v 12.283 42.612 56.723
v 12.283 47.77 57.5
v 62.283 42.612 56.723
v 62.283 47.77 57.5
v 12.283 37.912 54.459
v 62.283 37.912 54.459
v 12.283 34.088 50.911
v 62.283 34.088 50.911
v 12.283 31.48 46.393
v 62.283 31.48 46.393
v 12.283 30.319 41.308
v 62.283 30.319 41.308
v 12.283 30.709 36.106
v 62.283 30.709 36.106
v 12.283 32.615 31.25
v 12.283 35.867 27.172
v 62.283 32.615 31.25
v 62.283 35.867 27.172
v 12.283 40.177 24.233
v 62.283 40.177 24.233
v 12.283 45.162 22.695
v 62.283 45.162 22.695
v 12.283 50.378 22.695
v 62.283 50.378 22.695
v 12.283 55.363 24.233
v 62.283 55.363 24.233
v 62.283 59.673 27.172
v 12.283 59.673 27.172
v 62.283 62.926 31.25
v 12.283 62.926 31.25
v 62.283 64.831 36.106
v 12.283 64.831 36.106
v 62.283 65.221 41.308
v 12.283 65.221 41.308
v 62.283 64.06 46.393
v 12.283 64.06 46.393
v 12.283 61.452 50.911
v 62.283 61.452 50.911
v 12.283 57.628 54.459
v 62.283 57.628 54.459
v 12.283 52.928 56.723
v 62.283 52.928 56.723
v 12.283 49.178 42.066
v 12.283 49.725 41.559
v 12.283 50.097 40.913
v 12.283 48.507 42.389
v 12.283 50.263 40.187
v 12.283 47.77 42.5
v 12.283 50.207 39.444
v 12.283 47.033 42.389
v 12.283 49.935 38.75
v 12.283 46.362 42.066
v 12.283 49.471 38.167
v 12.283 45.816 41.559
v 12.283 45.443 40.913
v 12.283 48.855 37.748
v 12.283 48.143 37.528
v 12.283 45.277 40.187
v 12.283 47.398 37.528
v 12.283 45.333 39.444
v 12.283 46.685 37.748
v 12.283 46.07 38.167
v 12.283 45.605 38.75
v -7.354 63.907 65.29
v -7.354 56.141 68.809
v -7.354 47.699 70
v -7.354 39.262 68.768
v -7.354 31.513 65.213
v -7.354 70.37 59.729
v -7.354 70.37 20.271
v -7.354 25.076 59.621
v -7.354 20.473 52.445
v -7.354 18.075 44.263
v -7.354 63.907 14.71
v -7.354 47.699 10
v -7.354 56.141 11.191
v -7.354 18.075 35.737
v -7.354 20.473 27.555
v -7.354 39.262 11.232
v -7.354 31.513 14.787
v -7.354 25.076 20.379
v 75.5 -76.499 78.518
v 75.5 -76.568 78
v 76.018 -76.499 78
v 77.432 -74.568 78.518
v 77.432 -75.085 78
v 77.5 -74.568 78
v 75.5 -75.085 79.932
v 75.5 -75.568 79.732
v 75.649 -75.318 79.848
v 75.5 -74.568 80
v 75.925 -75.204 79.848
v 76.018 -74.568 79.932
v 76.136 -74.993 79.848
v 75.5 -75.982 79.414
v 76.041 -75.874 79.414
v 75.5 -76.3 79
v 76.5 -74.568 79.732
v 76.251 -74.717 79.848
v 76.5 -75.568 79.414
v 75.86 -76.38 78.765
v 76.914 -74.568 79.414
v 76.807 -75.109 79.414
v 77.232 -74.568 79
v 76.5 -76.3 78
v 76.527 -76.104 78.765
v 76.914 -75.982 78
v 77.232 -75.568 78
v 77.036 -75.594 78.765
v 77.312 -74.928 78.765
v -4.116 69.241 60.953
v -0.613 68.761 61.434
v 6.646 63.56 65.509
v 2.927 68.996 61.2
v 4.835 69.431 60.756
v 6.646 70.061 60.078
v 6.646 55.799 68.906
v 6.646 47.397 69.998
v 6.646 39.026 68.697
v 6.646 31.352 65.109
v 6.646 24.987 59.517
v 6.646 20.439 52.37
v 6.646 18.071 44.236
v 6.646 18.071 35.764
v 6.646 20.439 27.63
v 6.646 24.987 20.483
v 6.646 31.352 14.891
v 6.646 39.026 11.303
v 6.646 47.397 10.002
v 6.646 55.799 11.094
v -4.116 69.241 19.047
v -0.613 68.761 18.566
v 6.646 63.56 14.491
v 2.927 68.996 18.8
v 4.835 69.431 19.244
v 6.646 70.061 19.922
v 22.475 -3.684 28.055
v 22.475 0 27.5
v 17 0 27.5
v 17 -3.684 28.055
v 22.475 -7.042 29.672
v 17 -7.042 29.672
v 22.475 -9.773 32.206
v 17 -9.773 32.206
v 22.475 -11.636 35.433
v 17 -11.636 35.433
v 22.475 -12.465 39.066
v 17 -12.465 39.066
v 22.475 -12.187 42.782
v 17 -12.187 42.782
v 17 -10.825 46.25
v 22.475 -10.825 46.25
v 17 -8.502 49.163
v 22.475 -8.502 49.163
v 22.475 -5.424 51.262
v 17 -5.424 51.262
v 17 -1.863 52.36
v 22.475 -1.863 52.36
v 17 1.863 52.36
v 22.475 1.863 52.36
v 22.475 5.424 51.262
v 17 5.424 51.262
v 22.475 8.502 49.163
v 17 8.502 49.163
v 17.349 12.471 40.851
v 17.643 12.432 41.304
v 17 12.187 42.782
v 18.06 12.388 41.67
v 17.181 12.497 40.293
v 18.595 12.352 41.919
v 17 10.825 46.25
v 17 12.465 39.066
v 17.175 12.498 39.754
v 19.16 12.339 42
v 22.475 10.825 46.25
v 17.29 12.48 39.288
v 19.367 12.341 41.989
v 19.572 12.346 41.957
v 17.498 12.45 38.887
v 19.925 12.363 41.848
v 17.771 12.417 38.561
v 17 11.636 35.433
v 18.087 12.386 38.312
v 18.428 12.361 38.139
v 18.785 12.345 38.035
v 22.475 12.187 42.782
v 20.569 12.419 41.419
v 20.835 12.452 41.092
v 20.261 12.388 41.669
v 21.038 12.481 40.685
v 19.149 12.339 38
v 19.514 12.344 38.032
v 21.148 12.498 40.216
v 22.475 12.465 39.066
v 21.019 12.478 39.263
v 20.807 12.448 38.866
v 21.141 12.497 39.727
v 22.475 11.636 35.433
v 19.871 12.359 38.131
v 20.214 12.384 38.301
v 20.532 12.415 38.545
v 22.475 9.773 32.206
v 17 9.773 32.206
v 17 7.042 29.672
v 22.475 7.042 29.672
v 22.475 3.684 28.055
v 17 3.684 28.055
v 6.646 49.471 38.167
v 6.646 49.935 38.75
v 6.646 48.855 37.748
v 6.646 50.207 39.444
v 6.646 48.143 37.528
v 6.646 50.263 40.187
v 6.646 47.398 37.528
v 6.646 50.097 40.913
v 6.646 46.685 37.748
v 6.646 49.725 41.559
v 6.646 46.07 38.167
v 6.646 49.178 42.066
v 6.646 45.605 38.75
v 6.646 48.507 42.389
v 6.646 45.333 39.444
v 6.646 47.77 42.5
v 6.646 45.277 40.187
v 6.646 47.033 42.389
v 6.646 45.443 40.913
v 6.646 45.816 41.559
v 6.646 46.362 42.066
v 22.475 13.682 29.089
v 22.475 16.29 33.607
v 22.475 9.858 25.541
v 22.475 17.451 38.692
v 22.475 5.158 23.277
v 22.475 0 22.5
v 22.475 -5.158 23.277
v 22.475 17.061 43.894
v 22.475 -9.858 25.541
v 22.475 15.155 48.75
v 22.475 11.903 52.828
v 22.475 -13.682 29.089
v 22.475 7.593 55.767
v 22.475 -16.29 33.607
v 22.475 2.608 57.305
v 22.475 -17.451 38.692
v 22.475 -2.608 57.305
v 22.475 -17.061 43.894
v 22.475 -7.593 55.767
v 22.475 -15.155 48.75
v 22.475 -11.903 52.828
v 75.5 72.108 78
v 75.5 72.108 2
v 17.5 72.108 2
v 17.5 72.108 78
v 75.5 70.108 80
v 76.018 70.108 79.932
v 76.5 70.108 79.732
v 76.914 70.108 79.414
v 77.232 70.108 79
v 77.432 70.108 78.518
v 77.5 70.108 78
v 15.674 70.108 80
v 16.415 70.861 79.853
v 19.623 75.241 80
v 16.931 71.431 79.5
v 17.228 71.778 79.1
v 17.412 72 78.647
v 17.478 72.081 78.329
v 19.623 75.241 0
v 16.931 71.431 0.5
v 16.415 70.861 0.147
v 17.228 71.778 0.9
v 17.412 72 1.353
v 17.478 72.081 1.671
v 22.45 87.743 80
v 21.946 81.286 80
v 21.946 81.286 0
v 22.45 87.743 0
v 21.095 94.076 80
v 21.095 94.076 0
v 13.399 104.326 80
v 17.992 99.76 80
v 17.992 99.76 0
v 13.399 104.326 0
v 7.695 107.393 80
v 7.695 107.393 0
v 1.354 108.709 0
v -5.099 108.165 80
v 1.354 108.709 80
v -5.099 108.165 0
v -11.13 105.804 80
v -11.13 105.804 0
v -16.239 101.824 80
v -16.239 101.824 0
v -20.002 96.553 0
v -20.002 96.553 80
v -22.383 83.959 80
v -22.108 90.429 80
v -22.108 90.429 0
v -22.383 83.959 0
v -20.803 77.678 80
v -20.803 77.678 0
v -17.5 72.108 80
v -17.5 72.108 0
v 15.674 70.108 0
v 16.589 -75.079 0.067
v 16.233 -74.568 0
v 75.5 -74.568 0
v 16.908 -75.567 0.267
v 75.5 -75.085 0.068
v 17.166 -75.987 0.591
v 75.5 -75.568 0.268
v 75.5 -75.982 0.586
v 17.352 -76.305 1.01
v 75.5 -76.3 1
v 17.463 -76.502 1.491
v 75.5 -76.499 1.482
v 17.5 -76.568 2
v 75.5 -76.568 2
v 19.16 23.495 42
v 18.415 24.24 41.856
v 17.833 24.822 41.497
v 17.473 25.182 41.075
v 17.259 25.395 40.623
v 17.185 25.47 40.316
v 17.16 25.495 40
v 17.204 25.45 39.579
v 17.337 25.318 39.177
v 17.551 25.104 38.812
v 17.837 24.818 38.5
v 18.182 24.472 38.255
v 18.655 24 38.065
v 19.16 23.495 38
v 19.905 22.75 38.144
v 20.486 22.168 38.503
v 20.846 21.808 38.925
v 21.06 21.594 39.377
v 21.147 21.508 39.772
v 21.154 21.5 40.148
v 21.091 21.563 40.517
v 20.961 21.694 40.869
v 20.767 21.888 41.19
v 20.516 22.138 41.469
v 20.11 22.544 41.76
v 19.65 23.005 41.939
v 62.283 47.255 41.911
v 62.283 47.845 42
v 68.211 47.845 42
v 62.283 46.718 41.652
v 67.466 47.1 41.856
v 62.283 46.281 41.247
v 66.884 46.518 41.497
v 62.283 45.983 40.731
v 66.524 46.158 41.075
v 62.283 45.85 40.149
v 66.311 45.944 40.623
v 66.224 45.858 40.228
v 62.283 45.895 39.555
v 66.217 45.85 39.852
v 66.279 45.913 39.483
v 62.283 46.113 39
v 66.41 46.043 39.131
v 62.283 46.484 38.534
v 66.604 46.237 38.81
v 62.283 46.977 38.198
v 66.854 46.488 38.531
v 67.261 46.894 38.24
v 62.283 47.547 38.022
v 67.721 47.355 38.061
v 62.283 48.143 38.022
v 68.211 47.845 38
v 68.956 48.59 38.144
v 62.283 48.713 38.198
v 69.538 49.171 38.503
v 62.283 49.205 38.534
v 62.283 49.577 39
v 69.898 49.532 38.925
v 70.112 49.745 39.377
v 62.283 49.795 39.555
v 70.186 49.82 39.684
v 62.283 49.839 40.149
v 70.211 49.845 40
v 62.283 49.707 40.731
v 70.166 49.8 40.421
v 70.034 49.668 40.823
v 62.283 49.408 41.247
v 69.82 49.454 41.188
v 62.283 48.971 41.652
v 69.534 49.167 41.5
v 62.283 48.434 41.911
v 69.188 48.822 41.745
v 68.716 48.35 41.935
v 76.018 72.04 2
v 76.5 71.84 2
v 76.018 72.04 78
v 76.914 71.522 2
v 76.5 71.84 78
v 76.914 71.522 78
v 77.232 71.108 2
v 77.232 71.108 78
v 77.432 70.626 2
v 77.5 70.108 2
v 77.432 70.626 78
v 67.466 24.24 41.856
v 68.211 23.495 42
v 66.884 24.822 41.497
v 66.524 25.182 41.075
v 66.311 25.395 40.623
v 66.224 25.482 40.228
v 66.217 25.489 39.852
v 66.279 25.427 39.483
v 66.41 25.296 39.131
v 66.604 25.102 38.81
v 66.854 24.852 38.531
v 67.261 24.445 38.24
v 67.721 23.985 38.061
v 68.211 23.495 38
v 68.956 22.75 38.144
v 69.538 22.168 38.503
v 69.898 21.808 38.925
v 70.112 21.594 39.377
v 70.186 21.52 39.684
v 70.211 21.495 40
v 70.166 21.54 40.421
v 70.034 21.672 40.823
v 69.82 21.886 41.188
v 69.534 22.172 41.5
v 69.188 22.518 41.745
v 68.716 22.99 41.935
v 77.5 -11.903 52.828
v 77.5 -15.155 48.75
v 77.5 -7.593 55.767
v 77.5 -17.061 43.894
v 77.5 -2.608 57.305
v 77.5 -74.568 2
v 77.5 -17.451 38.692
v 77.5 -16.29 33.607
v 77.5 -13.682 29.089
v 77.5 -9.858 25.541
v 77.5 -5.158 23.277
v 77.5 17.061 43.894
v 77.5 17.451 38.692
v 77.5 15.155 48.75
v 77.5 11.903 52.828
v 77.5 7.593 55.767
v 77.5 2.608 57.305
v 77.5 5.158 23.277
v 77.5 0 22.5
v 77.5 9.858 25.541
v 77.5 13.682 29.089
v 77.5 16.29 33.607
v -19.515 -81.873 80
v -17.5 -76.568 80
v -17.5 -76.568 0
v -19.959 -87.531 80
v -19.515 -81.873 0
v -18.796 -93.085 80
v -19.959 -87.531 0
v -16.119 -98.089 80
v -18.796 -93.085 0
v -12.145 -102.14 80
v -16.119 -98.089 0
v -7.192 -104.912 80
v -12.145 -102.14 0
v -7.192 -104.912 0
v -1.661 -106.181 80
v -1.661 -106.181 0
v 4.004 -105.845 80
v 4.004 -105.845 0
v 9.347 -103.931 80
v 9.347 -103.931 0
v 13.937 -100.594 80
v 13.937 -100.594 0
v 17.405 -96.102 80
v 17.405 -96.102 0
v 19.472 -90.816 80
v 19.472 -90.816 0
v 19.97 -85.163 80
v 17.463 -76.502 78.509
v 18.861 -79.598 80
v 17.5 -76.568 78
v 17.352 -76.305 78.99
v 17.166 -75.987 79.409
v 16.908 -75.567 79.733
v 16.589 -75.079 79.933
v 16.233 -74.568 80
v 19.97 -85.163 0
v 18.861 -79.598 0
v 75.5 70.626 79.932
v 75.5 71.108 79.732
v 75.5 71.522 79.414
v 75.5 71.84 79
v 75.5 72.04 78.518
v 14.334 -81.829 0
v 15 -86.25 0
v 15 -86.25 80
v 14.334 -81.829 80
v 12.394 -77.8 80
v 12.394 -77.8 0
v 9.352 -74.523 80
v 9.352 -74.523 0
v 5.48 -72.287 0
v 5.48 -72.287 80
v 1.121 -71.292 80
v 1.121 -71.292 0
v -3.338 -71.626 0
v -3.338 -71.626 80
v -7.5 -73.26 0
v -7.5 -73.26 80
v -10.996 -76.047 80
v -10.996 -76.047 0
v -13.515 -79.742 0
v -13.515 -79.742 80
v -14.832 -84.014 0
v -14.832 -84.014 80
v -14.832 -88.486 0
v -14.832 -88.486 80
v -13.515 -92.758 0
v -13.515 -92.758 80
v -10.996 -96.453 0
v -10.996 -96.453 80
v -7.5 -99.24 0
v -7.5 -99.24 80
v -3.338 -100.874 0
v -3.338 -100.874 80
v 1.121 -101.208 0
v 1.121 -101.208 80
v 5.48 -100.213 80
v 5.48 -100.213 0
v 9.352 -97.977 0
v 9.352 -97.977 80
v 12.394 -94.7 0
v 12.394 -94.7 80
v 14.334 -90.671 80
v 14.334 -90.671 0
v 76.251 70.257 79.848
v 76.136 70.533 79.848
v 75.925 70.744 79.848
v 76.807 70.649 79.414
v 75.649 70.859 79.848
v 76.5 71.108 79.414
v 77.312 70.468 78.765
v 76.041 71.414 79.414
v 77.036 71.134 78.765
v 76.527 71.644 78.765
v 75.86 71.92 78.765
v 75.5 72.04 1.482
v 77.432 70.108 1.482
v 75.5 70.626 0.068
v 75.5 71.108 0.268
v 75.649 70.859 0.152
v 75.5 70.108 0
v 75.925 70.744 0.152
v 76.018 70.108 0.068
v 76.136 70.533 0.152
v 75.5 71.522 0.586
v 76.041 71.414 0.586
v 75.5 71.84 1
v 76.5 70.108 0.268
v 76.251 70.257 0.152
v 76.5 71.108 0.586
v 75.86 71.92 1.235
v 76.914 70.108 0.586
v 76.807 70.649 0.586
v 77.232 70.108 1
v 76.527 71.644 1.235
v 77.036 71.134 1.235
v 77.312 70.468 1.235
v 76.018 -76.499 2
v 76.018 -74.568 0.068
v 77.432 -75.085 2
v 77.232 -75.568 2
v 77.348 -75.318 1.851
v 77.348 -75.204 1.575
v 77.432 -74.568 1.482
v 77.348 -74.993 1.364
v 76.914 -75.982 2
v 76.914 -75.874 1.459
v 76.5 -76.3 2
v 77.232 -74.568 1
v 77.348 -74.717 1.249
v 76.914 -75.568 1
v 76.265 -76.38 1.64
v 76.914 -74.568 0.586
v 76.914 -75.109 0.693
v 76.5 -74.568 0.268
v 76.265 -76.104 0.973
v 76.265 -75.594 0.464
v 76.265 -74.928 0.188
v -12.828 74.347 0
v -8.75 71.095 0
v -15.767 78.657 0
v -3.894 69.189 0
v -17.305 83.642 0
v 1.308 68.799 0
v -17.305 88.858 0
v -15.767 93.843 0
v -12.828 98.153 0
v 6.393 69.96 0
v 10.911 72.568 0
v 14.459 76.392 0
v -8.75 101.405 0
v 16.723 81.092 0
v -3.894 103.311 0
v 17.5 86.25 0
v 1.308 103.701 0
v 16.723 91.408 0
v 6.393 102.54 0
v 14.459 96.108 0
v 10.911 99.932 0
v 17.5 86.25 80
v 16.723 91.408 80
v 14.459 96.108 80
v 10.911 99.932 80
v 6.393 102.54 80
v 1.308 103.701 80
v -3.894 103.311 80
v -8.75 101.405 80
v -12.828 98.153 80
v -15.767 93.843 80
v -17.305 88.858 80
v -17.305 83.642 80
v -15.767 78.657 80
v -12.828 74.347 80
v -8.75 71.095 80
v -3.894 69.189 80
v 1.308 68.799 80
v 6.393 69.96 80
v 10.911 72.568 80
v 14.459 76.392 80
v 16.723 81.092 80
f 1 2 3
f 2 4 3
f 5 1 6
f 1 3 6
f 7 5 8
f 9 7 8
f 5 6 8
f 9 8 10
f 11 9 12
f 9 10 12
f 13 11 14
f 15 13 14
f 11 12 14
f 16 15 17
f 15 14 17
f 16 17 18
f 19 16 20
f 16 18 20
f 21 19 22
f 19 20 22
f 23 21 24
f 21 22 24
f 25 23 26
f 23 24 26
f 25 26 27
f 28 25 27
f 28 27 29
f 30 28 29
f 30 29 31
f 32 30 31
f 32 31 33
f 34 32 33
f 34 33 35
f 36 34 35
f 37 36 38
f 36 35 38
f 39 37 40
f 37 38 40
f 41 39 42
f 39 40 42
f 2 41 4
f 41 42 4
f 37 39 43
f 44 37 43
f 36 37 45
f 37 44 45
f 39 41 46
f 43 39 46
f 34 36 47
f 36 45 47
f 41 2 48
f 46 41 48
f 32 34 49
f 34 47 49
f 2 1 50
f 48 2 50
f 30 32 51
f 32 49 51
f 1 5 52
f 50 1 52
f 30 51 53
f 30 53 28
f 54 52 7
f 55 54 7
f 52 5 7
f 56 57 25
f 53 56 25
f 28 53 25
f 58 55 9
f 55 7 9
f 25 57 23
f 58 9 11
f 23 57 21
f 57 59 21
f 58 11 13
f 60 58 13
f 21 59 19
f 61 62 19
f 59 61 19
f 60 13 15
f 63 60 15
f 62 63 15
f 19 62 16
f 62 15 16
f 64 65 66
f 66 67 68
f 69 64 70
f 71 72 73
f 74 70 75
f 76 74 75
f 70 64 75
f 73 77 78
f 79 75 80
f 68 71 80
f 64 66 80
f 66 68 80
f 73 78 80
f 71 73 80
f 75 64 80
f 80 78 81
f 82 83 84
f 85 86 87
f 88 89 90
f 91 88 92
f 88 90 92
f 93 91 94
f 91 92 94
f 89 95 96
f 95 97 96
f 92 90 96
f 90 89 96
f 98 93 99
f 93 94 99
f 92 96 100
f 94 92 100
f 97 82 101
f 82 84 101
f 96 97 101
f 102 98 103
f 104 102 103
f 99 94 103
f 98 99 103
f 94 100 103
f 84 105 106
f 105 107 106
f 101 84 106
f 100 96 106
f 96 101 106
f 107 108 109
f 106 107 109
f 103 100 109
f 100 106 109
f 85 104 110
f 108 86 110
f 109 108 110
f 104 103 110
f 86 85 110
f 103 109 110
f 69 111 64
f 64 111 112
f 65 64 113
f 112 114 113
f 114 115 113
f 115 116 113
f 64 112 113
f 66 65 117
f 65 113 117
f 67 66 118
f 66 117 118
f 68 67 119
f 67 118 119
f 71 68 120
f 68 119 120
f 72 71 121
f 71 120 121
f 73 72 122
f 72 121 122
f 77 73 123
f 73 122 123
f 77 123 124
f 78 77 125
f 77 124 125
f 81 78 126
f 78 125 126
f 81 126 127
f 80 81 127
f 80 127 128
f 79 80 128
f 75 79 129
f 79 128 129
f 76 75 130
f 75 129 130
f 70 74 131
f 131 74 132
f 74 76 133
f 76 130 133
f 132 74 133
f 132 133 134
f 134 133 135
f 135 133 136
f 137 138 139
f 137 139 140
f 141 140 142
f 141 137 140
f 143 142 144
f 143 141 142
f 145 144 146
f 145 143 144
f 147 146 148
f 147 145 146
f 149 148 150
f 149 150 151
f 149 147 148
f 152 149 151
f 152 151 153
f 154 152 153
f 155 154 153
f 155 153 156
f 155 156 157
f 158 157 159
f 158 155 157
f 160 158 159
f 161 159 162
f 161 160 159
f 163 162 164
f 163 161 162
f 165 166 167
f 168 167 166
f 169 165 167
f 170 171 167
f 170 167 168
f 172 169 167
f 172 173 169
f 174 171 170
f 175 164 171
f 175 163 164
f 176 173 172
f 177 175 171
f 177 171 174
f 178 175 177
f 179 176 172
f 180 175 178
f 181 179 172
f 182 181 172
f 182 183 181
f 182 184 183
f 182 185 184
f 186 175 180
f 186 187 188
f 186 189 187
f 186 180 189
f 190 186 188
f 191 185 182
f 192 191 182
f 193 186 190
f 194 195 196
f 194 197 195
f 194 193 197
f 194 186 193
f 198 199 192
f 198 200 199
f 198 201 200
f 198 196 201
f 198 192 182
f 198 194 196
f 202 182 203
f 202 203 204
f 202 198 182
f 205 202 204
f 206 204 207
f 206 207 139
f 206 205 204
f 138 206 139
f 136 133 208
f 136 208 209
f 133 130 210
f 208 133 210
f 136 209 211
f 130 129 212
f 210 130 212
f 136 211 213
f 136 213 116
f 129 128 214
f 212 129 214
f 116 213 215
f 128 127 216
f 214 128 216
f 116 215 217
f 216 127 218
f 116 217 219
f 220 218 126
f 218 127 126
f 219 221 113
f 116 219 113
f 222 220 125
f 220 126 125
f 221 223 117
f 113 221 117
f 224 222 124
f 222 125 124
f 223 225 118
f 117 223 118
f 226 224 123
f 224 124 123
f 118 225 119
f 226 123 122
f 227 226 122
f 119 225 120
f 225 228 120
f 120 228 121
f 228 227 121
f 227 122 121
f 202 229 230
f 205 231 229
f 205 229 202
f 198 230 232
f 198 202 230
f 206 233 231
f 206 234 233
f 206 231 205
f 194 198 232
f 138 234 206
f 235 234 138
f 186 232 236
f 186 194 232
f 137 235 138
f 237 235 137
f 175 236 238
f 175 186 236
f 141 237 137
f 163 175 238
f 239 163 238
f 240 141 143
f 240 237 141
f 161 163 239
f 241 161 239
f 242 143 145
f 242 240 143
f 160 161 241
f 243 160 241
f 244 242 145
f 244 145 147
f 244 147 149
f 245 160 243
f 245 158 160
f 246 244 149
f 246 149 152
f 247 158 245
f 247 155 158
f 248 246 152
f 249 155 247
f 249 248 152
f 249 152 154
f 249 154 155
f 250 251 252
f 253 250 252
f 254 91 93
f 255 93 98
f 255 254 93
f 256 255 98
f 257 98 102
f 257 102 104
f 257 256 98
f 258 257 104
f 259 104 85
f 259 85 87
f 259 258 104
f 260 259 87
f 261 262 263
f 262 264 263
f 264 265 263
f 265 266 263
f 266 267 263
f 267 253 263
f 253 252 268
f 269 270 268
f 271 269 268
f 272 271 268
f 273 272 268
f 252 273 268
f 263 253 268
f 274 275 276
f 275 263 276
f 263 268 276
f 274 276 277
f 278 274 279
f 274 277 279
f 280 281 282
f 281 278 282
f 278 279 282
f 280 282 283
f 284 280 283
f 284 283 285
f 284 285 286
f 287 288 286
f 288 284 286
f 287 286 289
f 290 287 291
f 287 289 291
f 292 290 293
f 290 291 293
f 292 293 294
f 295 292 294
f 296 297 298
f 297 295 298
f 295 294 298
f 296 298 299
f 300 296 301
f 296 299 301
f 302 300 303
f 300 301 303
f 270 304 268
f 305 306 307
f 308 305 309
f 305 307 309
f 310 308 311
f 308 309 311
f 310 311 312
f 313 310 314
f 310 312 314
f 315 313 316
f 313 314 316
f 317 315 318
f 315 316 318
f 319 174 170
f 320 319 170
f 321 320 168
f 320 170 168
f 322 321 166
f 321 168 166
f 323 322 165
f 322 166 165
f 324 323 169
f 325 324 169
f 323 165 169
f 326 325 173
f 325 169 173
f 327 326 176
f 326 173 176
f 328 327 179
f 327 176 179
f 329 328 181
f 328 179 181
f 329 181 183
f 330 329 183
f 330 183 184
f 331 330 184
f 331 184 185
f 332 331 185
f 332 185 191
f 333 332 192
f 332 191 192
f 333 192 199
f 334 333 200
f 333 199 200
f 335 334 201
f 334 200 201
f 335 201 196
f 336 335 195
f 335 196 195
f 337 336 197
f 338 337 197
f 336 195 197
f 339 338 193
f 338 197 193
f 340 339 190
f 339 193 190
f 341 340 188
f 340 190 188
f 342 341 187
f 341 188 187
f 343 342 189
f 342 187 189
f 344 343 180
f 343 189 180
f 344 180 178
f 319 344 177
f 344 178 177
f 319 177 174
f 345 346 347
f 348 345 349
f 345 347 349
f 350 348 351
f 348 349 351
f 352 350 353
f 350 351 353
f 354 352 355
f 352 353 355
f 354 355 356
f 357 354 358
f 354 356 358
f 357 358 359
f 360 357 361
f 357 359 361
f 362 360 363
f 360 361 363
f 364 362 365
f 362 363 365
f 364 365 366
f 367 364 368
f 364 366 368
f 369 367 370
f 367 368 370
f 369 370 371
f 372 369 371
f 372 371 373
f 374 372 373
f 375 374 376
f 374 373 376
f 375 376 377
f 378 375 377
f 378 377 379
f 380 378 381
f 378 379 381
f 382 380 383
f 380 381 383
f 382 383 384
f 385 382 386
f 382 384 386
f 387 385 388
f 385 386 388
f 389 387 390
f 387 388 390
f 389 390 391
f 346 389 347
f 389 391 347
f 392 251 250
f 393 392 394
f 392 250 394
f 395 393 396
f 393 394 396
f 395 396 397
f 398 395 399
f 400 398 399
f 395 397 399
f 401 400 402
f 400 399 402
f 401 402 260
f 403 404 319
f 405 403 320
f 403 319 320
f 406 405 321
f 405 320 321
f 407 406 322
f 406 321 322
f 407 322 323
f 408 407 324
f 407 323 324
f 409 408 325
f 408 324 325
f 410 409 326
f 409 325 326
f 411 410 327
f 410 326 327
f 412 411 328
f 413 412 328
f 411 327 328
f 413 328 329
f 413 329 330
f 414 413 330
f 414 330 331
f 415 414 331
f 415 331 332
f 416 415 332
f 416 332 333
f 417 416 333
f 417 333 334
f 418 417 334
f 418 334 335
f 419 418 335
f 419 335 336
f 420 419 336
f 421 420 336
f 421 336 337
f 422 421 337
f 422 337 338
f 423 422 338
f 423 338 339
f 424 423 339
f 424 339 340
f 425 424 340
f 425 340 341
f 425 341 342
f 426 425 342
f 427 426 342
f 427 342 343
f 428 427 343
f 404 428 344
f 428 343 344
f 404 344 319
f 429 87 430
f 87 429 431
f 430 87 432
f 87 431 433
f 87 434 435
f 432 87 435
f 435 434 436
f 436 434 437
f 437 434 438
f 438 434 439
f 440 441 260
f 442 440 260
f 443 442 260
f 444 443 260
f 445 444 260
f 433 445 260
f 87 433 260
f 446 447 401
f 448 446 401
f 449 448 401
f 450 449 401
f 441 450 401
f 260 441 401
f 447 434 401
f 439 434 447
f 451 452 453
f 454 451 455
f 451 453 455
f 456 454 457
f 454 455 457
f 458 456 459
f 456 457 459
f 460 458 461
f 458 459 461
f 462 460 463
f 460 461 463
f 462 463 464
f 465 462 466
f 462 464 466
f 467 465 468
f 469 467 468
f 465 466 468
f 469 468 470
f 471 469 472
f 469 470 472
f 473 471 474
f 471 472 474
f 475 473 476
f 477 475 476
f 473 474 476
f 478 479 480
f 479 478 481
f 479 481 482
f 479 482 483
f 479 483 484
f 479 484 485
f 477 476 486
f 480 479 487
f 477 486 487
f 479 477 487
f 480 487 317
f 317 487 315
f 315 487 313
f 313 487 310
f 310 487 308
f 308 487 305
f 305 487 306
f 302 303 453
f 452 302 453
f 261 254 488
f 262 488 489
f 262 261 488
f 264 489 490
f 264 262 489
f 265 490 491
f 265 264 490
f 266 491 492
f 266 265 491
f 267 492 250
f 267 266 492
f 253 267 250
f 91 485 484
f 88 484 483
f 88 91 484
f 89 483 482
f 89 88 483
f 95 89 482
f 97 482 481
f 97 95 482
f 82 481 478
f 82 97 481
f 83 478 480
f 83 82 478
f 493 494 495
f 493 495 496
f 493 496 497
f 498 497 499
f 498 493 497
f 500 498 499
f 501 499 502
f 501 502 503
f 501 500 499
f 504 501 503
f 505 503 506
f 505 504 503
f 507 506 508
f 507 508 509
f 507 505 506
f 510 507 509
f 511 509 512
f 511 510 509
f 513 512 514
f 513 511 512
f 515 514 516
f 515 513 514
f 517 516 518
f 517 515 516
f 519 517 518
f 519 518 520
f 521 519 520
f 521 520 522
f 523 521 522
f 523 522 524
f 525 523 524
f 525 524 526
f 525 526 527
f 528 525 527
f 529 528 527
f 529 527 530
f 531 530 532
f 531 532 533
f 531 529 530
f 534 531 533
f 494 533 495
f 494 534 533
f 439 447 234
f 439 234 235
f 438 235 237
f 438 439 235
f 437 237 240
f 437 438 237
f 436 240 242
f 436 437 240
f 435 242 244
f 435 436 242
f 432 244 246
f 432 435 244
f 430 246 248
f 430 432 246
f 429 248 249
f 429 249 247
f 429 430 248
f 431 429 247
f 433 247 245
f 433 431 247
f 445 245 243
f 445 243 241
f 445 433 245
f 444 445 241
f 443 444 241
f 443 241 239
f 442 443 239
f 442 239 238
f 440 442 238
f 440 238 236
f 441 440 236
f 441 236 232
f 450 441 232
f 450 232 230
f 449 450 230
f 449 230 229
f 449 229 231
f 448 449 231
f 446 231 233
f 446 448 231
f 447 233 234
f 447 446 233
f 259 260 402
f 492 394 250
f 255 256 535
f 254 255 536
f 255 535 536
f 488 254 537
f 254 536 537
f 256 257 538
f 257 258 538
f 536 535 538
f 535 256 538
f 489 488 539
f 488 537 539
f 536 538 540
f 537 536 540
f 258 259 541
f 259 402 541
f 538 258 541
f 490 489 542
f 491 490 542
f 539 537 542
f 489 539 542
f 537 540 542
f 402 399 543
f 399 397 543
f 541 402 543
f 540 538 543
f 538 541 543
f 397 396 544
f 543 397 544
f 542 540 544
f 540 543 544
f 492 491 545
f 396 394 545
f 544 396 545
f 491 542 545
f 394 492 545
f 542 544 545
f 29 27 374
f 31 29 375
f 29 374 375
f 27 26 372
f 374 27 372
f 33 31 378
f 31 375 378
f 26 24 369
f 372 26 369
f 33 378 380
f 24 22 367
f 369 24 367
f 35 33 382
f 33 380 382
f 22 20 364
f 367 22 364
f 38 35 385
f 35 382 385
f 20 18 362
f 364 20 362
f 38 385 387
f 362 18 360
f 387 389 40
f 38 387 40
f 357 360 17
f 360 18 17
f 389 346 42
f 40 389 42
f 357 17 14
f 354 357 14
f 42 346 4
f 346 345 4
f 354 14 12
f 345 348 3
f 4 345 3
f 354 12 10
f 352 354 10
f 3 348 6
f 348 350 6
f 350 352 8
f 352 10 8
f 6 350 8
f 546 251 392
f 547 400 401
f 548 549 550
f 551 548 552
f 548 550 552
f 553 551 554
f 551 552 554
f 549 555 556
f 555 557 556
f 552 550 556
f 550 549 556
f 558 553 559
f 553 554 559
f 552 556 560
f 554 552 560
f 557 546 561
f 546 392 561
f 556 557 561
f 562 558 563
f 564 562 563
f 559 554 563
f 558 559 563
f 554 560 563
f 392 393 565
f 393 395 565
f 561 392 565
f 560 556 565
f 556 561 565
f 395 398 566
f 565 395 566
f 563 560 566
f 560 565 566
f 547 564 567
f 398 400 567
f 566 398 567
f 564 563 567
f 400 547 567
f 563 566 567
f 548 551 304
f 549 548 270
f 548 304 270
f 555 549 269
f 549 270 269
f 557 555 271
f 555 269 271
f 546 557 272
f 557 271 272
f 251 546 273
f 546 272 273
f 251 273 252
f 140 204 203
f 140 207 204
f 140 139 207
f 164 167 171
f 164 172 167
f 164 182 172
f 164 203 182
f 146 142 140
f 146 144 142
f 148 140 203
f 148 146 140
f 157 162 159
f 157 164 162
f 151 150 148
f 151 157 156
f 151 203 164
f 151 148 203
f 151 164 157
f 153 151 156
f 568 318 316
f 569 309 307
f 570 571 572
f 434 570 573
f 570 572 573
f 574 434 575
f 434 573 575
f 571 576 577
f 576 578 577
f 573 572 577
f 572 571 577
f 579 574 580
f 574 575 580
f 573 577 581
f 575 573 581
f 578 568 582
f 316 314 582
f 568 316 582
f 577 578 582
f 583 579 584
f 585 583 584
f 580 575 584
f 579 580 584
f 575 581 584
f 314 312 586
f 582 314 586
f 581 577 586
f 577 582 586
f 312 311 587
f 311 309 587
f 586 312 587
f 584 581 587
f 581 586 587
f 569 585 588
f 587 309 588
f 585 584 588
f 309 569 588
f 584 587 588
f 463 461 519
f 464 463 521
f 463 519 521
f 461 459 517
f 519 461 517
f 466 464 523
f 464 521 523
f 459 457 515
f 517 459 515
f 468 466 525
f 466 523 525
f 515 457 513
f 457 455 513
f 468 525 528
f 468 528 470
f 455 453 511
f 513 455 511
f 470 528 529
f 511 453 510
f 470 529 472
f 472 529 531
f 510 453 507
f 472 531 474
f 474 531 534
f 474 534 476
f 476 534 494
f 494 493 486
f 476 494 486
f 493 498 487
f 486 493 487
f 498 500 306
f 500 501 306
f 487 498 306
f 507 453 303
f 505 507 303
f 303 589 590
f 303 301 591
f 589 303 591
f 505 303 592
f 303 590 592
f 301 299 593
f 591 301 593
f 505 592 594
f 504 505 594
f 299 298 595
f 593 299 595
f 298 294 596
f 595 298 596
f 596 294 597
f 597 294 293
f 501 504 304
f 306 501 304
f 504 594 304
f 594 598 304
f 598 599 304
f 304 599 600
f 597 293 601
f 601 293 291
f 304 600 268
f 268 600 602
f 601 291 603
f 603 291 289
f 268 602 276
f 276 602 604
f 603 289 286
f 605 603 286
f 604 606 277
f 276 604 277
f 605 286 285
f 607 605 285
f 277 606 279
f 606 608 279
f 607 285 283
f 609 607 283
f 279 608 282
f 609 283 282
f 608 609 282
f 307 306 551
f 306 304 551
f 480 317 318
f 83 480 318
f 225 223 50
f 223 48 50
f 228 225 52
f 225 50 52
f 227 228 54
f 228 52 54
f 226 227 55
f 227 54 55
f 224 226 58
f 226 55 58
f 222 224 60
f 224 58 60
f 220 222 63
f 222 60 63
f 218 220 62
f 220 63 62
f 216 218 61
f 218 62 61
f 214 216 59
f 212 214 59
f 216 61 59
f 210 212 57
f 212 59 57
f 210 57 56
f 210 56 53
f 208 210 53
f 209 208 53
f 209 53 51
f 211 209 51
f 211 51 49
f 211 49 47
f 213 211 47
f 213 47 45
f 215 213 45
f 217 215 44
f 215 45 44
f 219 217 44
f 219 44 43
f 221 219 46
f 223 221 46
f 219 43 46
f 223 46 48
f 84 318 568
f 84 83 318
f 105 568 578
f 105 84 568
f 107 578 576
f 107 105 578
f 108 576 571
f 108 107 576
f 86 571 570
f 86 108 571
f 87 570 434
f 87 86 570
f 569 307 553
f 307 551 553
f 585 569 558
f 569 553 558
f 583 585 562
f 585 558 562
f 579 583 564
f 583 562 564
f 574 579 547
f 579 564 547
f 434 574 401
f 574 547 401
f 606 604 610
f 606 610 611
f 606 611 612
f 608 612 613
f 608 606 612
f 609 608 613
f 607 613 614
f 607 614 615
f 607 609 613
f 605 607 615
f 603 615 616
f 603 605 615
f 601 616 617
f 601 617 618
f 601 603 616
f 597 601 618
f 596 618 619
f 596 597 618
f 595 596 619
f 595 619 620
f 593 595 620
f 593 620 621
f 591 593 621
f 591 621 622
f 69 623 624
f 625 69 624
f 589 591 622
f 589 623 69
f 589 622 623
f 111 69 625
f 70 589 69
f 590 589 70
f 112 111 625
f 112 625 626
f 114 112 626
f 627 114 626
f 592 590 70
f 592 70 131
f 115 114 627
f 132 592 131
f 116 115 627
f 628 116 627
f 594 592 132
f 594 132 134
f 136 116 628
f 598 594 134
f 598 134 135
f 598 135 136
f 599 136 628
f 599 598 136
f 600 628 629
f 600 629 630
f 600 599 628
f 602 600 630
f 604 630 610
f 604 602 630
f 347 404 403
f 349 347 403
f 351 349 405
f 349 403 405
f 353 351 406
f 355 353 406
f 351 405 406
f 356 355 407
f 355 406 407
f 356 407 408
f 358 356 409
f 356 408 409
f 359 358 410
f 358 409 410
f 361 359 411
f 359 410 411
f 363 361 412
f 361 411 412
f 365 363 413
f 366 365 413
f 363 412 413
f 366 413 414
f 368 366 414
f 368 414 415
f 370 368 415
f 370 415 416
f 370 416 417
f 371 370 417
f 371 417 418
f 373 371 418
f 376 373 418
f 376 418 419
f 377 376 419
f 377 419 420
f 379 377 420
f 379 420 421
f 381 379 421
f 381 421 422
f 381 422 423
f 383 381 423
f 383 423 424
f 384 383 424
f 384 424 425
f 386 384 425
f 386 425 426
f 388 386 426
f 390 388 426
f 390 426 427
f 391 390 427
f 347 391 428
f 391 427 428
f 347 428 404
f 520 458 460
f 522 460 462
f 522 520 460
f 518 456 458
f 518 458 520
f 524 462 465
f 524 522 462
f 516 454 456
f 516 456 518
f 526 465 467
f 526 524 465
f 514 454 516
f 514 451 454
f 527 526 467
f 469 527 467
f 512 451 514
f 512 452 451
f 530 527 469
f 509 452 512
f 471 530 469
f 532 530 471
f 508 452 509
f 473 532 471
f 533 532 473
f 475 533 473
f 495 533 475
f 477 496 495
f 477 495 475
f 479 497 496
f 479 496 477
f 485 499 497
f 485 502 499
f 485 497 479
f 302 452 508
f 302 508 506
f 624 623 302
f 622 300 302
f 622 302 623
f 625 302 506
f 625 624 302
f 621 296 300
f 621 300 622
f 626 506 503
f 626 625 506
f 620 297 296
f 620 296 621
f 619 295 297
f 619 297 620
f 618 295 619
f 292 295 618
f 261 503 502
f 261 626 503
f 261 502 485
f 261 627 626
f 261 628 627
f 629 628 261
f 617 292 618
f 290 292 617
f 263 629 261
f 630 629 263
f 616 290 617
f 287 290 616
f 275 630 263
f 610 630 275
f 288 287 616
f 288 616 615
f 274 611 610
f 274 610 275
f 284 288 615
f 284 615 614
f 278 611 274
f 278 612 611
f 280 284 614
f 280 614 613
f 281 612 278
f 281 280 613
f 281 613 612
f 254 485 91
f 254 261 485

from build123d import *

# Parameters (mm, degrees)
SKETCH1_R            = 17.5
SKETCH1_R_2          = 15
BOSS_EXTRUDE1_DEPTH  = 80
CUT_SWEEP3_PROFILE_R = 2
FILLET2_R            = 2


with BuildPart() as part:
    # Sketch1 → Boss-Extrude1 (new body)
    with BuildSketch(Plane.XY):
        with BuildLine():
            Line((-17.5, 72.107864376), (-17.5, 63.75))
            Line((-17.5, 63.75), (-17.5, -66.25))
            Line((-17.5, -66.25), (-17.5, -76.567541634))
            ThreePointArc((-17.5, -76.567541634), (0, -106.25), (17.5, -76.567541634))
            Line((17.5, -76.567541634), (77.5, -76.567541634))
            Line((77.5, -76.567541634), (77.5, 72.107864376))
            Line((77.5, 72.107864376), (17.5, 72.107864376))
            ThreePointArc((17.5, 72.107864376), (0, 108.75), (-17.5, 72.107864376))
        make_face()
        with Locations((0, 86.25)):
            Circle(SKETCH1_R, mode=Mode.SUBTRACT)
        with Locations((0, -86.25)):
            Circle(SKETCH1_R_2, mode=Mode.SUBTRACT)
    extrude(amount=BOSS_EXTRUDE1_DEPTH)

    # Sketch9 → Cut-Revolve1 (revolve, cut)
    with BuildSketch(Plane.XY.offset(40), mode=Mode.PRIVATE) as cut_revolve1_sk:
        Polygon((-7.353554792, 47.770161371), (-7.353554792, 17.770161371), (6.646445208, 17.770161371), (6.646445208, 45.270161371), (12.283096941, 45.270161371), (12.283096941, 30.270161371), (62.283096941, 30.270161371), (62.283096941, 47.770161371), align=None)
    revolve(cut_revolve1_sk.sketch.rotate(Axis((-48.211470633, 47.770161371, 40), (1, 0, 0)), 270), axis=Axis((-48.211470633, 47.770161371, 40), (1, 0, 0)), mode=Mode.SUBTRACT)

    # Sketch38 → Cut-Revolve3 (revolve, cut)
    with BuildSketch(Plane.XY.offset(40), mode=Mode.PRIVATE) as cut_revolve3_sk:
        Polygon((17, 0), (17, 12.5), (22.475179435, 12.5), (22.475179435, 17.5), (102.052596933, 17.5), (102.052596933, 0), align=None)
    revolve(cut_revolve3_sk.sketch.rotate(Axis((102.052596933, 0, 40), (-1, 0, 0)), 90), axis=Axis((102.052596933, 0, 40), (-1, 0, 0)), mode=Mode.SUBTRACT)

    # Cut-Sweep3: sweep along a path in Sketch60
    with BuildLine(Plane.XY.offset(40)) as cut_sweep3_path:
        Line((57.751179251, 47.84482156), (68.211067836, 47.84482156))
        Line((68.211067836, 47.84482156), (68.211067836, 23.494918311))
        Line((68.211067836, 23.494918311), (19.159559926, 23.494918311))
        Line((19.159559926, 23.494918311), (19.159559926, 12.07117719))
    # Cut-Sweep3 profile (on start of the path) → Cut-Sweep3 (sweep, cut)
    with BuildSketch(Plane(origin=(57.751179251, 47.84482156, 40), x_dir=(0, 0, 1), z_dir=(1, 0, 0))):
        Circle(CUT_SWEEP3_PROFILE_R)
    sweep(path=cut_sweep3_path.line, transition=Transition.RIGHT, mode=Mode.SUBTRACT)

    # Fillet2
    fillet2_edges = [part.edges().sort_by_distance(p)[0] for p in [
        (47.5, -76.567541634, 0),
        (77.5, 72.107864376, 40),
        (77.5, -76.567541634, 40),
        (47.5, -76.567541634, 80),
        (77.5, -2.229838629, 80),
        (47.5, 72.107864376, 80),
        (47.5, 72.107864376, 0),
        (77.5, -2.229838629, 0),
    ]]
    fillet(fillet2_edges, radius=FILLET2_R)


solid = part.part
